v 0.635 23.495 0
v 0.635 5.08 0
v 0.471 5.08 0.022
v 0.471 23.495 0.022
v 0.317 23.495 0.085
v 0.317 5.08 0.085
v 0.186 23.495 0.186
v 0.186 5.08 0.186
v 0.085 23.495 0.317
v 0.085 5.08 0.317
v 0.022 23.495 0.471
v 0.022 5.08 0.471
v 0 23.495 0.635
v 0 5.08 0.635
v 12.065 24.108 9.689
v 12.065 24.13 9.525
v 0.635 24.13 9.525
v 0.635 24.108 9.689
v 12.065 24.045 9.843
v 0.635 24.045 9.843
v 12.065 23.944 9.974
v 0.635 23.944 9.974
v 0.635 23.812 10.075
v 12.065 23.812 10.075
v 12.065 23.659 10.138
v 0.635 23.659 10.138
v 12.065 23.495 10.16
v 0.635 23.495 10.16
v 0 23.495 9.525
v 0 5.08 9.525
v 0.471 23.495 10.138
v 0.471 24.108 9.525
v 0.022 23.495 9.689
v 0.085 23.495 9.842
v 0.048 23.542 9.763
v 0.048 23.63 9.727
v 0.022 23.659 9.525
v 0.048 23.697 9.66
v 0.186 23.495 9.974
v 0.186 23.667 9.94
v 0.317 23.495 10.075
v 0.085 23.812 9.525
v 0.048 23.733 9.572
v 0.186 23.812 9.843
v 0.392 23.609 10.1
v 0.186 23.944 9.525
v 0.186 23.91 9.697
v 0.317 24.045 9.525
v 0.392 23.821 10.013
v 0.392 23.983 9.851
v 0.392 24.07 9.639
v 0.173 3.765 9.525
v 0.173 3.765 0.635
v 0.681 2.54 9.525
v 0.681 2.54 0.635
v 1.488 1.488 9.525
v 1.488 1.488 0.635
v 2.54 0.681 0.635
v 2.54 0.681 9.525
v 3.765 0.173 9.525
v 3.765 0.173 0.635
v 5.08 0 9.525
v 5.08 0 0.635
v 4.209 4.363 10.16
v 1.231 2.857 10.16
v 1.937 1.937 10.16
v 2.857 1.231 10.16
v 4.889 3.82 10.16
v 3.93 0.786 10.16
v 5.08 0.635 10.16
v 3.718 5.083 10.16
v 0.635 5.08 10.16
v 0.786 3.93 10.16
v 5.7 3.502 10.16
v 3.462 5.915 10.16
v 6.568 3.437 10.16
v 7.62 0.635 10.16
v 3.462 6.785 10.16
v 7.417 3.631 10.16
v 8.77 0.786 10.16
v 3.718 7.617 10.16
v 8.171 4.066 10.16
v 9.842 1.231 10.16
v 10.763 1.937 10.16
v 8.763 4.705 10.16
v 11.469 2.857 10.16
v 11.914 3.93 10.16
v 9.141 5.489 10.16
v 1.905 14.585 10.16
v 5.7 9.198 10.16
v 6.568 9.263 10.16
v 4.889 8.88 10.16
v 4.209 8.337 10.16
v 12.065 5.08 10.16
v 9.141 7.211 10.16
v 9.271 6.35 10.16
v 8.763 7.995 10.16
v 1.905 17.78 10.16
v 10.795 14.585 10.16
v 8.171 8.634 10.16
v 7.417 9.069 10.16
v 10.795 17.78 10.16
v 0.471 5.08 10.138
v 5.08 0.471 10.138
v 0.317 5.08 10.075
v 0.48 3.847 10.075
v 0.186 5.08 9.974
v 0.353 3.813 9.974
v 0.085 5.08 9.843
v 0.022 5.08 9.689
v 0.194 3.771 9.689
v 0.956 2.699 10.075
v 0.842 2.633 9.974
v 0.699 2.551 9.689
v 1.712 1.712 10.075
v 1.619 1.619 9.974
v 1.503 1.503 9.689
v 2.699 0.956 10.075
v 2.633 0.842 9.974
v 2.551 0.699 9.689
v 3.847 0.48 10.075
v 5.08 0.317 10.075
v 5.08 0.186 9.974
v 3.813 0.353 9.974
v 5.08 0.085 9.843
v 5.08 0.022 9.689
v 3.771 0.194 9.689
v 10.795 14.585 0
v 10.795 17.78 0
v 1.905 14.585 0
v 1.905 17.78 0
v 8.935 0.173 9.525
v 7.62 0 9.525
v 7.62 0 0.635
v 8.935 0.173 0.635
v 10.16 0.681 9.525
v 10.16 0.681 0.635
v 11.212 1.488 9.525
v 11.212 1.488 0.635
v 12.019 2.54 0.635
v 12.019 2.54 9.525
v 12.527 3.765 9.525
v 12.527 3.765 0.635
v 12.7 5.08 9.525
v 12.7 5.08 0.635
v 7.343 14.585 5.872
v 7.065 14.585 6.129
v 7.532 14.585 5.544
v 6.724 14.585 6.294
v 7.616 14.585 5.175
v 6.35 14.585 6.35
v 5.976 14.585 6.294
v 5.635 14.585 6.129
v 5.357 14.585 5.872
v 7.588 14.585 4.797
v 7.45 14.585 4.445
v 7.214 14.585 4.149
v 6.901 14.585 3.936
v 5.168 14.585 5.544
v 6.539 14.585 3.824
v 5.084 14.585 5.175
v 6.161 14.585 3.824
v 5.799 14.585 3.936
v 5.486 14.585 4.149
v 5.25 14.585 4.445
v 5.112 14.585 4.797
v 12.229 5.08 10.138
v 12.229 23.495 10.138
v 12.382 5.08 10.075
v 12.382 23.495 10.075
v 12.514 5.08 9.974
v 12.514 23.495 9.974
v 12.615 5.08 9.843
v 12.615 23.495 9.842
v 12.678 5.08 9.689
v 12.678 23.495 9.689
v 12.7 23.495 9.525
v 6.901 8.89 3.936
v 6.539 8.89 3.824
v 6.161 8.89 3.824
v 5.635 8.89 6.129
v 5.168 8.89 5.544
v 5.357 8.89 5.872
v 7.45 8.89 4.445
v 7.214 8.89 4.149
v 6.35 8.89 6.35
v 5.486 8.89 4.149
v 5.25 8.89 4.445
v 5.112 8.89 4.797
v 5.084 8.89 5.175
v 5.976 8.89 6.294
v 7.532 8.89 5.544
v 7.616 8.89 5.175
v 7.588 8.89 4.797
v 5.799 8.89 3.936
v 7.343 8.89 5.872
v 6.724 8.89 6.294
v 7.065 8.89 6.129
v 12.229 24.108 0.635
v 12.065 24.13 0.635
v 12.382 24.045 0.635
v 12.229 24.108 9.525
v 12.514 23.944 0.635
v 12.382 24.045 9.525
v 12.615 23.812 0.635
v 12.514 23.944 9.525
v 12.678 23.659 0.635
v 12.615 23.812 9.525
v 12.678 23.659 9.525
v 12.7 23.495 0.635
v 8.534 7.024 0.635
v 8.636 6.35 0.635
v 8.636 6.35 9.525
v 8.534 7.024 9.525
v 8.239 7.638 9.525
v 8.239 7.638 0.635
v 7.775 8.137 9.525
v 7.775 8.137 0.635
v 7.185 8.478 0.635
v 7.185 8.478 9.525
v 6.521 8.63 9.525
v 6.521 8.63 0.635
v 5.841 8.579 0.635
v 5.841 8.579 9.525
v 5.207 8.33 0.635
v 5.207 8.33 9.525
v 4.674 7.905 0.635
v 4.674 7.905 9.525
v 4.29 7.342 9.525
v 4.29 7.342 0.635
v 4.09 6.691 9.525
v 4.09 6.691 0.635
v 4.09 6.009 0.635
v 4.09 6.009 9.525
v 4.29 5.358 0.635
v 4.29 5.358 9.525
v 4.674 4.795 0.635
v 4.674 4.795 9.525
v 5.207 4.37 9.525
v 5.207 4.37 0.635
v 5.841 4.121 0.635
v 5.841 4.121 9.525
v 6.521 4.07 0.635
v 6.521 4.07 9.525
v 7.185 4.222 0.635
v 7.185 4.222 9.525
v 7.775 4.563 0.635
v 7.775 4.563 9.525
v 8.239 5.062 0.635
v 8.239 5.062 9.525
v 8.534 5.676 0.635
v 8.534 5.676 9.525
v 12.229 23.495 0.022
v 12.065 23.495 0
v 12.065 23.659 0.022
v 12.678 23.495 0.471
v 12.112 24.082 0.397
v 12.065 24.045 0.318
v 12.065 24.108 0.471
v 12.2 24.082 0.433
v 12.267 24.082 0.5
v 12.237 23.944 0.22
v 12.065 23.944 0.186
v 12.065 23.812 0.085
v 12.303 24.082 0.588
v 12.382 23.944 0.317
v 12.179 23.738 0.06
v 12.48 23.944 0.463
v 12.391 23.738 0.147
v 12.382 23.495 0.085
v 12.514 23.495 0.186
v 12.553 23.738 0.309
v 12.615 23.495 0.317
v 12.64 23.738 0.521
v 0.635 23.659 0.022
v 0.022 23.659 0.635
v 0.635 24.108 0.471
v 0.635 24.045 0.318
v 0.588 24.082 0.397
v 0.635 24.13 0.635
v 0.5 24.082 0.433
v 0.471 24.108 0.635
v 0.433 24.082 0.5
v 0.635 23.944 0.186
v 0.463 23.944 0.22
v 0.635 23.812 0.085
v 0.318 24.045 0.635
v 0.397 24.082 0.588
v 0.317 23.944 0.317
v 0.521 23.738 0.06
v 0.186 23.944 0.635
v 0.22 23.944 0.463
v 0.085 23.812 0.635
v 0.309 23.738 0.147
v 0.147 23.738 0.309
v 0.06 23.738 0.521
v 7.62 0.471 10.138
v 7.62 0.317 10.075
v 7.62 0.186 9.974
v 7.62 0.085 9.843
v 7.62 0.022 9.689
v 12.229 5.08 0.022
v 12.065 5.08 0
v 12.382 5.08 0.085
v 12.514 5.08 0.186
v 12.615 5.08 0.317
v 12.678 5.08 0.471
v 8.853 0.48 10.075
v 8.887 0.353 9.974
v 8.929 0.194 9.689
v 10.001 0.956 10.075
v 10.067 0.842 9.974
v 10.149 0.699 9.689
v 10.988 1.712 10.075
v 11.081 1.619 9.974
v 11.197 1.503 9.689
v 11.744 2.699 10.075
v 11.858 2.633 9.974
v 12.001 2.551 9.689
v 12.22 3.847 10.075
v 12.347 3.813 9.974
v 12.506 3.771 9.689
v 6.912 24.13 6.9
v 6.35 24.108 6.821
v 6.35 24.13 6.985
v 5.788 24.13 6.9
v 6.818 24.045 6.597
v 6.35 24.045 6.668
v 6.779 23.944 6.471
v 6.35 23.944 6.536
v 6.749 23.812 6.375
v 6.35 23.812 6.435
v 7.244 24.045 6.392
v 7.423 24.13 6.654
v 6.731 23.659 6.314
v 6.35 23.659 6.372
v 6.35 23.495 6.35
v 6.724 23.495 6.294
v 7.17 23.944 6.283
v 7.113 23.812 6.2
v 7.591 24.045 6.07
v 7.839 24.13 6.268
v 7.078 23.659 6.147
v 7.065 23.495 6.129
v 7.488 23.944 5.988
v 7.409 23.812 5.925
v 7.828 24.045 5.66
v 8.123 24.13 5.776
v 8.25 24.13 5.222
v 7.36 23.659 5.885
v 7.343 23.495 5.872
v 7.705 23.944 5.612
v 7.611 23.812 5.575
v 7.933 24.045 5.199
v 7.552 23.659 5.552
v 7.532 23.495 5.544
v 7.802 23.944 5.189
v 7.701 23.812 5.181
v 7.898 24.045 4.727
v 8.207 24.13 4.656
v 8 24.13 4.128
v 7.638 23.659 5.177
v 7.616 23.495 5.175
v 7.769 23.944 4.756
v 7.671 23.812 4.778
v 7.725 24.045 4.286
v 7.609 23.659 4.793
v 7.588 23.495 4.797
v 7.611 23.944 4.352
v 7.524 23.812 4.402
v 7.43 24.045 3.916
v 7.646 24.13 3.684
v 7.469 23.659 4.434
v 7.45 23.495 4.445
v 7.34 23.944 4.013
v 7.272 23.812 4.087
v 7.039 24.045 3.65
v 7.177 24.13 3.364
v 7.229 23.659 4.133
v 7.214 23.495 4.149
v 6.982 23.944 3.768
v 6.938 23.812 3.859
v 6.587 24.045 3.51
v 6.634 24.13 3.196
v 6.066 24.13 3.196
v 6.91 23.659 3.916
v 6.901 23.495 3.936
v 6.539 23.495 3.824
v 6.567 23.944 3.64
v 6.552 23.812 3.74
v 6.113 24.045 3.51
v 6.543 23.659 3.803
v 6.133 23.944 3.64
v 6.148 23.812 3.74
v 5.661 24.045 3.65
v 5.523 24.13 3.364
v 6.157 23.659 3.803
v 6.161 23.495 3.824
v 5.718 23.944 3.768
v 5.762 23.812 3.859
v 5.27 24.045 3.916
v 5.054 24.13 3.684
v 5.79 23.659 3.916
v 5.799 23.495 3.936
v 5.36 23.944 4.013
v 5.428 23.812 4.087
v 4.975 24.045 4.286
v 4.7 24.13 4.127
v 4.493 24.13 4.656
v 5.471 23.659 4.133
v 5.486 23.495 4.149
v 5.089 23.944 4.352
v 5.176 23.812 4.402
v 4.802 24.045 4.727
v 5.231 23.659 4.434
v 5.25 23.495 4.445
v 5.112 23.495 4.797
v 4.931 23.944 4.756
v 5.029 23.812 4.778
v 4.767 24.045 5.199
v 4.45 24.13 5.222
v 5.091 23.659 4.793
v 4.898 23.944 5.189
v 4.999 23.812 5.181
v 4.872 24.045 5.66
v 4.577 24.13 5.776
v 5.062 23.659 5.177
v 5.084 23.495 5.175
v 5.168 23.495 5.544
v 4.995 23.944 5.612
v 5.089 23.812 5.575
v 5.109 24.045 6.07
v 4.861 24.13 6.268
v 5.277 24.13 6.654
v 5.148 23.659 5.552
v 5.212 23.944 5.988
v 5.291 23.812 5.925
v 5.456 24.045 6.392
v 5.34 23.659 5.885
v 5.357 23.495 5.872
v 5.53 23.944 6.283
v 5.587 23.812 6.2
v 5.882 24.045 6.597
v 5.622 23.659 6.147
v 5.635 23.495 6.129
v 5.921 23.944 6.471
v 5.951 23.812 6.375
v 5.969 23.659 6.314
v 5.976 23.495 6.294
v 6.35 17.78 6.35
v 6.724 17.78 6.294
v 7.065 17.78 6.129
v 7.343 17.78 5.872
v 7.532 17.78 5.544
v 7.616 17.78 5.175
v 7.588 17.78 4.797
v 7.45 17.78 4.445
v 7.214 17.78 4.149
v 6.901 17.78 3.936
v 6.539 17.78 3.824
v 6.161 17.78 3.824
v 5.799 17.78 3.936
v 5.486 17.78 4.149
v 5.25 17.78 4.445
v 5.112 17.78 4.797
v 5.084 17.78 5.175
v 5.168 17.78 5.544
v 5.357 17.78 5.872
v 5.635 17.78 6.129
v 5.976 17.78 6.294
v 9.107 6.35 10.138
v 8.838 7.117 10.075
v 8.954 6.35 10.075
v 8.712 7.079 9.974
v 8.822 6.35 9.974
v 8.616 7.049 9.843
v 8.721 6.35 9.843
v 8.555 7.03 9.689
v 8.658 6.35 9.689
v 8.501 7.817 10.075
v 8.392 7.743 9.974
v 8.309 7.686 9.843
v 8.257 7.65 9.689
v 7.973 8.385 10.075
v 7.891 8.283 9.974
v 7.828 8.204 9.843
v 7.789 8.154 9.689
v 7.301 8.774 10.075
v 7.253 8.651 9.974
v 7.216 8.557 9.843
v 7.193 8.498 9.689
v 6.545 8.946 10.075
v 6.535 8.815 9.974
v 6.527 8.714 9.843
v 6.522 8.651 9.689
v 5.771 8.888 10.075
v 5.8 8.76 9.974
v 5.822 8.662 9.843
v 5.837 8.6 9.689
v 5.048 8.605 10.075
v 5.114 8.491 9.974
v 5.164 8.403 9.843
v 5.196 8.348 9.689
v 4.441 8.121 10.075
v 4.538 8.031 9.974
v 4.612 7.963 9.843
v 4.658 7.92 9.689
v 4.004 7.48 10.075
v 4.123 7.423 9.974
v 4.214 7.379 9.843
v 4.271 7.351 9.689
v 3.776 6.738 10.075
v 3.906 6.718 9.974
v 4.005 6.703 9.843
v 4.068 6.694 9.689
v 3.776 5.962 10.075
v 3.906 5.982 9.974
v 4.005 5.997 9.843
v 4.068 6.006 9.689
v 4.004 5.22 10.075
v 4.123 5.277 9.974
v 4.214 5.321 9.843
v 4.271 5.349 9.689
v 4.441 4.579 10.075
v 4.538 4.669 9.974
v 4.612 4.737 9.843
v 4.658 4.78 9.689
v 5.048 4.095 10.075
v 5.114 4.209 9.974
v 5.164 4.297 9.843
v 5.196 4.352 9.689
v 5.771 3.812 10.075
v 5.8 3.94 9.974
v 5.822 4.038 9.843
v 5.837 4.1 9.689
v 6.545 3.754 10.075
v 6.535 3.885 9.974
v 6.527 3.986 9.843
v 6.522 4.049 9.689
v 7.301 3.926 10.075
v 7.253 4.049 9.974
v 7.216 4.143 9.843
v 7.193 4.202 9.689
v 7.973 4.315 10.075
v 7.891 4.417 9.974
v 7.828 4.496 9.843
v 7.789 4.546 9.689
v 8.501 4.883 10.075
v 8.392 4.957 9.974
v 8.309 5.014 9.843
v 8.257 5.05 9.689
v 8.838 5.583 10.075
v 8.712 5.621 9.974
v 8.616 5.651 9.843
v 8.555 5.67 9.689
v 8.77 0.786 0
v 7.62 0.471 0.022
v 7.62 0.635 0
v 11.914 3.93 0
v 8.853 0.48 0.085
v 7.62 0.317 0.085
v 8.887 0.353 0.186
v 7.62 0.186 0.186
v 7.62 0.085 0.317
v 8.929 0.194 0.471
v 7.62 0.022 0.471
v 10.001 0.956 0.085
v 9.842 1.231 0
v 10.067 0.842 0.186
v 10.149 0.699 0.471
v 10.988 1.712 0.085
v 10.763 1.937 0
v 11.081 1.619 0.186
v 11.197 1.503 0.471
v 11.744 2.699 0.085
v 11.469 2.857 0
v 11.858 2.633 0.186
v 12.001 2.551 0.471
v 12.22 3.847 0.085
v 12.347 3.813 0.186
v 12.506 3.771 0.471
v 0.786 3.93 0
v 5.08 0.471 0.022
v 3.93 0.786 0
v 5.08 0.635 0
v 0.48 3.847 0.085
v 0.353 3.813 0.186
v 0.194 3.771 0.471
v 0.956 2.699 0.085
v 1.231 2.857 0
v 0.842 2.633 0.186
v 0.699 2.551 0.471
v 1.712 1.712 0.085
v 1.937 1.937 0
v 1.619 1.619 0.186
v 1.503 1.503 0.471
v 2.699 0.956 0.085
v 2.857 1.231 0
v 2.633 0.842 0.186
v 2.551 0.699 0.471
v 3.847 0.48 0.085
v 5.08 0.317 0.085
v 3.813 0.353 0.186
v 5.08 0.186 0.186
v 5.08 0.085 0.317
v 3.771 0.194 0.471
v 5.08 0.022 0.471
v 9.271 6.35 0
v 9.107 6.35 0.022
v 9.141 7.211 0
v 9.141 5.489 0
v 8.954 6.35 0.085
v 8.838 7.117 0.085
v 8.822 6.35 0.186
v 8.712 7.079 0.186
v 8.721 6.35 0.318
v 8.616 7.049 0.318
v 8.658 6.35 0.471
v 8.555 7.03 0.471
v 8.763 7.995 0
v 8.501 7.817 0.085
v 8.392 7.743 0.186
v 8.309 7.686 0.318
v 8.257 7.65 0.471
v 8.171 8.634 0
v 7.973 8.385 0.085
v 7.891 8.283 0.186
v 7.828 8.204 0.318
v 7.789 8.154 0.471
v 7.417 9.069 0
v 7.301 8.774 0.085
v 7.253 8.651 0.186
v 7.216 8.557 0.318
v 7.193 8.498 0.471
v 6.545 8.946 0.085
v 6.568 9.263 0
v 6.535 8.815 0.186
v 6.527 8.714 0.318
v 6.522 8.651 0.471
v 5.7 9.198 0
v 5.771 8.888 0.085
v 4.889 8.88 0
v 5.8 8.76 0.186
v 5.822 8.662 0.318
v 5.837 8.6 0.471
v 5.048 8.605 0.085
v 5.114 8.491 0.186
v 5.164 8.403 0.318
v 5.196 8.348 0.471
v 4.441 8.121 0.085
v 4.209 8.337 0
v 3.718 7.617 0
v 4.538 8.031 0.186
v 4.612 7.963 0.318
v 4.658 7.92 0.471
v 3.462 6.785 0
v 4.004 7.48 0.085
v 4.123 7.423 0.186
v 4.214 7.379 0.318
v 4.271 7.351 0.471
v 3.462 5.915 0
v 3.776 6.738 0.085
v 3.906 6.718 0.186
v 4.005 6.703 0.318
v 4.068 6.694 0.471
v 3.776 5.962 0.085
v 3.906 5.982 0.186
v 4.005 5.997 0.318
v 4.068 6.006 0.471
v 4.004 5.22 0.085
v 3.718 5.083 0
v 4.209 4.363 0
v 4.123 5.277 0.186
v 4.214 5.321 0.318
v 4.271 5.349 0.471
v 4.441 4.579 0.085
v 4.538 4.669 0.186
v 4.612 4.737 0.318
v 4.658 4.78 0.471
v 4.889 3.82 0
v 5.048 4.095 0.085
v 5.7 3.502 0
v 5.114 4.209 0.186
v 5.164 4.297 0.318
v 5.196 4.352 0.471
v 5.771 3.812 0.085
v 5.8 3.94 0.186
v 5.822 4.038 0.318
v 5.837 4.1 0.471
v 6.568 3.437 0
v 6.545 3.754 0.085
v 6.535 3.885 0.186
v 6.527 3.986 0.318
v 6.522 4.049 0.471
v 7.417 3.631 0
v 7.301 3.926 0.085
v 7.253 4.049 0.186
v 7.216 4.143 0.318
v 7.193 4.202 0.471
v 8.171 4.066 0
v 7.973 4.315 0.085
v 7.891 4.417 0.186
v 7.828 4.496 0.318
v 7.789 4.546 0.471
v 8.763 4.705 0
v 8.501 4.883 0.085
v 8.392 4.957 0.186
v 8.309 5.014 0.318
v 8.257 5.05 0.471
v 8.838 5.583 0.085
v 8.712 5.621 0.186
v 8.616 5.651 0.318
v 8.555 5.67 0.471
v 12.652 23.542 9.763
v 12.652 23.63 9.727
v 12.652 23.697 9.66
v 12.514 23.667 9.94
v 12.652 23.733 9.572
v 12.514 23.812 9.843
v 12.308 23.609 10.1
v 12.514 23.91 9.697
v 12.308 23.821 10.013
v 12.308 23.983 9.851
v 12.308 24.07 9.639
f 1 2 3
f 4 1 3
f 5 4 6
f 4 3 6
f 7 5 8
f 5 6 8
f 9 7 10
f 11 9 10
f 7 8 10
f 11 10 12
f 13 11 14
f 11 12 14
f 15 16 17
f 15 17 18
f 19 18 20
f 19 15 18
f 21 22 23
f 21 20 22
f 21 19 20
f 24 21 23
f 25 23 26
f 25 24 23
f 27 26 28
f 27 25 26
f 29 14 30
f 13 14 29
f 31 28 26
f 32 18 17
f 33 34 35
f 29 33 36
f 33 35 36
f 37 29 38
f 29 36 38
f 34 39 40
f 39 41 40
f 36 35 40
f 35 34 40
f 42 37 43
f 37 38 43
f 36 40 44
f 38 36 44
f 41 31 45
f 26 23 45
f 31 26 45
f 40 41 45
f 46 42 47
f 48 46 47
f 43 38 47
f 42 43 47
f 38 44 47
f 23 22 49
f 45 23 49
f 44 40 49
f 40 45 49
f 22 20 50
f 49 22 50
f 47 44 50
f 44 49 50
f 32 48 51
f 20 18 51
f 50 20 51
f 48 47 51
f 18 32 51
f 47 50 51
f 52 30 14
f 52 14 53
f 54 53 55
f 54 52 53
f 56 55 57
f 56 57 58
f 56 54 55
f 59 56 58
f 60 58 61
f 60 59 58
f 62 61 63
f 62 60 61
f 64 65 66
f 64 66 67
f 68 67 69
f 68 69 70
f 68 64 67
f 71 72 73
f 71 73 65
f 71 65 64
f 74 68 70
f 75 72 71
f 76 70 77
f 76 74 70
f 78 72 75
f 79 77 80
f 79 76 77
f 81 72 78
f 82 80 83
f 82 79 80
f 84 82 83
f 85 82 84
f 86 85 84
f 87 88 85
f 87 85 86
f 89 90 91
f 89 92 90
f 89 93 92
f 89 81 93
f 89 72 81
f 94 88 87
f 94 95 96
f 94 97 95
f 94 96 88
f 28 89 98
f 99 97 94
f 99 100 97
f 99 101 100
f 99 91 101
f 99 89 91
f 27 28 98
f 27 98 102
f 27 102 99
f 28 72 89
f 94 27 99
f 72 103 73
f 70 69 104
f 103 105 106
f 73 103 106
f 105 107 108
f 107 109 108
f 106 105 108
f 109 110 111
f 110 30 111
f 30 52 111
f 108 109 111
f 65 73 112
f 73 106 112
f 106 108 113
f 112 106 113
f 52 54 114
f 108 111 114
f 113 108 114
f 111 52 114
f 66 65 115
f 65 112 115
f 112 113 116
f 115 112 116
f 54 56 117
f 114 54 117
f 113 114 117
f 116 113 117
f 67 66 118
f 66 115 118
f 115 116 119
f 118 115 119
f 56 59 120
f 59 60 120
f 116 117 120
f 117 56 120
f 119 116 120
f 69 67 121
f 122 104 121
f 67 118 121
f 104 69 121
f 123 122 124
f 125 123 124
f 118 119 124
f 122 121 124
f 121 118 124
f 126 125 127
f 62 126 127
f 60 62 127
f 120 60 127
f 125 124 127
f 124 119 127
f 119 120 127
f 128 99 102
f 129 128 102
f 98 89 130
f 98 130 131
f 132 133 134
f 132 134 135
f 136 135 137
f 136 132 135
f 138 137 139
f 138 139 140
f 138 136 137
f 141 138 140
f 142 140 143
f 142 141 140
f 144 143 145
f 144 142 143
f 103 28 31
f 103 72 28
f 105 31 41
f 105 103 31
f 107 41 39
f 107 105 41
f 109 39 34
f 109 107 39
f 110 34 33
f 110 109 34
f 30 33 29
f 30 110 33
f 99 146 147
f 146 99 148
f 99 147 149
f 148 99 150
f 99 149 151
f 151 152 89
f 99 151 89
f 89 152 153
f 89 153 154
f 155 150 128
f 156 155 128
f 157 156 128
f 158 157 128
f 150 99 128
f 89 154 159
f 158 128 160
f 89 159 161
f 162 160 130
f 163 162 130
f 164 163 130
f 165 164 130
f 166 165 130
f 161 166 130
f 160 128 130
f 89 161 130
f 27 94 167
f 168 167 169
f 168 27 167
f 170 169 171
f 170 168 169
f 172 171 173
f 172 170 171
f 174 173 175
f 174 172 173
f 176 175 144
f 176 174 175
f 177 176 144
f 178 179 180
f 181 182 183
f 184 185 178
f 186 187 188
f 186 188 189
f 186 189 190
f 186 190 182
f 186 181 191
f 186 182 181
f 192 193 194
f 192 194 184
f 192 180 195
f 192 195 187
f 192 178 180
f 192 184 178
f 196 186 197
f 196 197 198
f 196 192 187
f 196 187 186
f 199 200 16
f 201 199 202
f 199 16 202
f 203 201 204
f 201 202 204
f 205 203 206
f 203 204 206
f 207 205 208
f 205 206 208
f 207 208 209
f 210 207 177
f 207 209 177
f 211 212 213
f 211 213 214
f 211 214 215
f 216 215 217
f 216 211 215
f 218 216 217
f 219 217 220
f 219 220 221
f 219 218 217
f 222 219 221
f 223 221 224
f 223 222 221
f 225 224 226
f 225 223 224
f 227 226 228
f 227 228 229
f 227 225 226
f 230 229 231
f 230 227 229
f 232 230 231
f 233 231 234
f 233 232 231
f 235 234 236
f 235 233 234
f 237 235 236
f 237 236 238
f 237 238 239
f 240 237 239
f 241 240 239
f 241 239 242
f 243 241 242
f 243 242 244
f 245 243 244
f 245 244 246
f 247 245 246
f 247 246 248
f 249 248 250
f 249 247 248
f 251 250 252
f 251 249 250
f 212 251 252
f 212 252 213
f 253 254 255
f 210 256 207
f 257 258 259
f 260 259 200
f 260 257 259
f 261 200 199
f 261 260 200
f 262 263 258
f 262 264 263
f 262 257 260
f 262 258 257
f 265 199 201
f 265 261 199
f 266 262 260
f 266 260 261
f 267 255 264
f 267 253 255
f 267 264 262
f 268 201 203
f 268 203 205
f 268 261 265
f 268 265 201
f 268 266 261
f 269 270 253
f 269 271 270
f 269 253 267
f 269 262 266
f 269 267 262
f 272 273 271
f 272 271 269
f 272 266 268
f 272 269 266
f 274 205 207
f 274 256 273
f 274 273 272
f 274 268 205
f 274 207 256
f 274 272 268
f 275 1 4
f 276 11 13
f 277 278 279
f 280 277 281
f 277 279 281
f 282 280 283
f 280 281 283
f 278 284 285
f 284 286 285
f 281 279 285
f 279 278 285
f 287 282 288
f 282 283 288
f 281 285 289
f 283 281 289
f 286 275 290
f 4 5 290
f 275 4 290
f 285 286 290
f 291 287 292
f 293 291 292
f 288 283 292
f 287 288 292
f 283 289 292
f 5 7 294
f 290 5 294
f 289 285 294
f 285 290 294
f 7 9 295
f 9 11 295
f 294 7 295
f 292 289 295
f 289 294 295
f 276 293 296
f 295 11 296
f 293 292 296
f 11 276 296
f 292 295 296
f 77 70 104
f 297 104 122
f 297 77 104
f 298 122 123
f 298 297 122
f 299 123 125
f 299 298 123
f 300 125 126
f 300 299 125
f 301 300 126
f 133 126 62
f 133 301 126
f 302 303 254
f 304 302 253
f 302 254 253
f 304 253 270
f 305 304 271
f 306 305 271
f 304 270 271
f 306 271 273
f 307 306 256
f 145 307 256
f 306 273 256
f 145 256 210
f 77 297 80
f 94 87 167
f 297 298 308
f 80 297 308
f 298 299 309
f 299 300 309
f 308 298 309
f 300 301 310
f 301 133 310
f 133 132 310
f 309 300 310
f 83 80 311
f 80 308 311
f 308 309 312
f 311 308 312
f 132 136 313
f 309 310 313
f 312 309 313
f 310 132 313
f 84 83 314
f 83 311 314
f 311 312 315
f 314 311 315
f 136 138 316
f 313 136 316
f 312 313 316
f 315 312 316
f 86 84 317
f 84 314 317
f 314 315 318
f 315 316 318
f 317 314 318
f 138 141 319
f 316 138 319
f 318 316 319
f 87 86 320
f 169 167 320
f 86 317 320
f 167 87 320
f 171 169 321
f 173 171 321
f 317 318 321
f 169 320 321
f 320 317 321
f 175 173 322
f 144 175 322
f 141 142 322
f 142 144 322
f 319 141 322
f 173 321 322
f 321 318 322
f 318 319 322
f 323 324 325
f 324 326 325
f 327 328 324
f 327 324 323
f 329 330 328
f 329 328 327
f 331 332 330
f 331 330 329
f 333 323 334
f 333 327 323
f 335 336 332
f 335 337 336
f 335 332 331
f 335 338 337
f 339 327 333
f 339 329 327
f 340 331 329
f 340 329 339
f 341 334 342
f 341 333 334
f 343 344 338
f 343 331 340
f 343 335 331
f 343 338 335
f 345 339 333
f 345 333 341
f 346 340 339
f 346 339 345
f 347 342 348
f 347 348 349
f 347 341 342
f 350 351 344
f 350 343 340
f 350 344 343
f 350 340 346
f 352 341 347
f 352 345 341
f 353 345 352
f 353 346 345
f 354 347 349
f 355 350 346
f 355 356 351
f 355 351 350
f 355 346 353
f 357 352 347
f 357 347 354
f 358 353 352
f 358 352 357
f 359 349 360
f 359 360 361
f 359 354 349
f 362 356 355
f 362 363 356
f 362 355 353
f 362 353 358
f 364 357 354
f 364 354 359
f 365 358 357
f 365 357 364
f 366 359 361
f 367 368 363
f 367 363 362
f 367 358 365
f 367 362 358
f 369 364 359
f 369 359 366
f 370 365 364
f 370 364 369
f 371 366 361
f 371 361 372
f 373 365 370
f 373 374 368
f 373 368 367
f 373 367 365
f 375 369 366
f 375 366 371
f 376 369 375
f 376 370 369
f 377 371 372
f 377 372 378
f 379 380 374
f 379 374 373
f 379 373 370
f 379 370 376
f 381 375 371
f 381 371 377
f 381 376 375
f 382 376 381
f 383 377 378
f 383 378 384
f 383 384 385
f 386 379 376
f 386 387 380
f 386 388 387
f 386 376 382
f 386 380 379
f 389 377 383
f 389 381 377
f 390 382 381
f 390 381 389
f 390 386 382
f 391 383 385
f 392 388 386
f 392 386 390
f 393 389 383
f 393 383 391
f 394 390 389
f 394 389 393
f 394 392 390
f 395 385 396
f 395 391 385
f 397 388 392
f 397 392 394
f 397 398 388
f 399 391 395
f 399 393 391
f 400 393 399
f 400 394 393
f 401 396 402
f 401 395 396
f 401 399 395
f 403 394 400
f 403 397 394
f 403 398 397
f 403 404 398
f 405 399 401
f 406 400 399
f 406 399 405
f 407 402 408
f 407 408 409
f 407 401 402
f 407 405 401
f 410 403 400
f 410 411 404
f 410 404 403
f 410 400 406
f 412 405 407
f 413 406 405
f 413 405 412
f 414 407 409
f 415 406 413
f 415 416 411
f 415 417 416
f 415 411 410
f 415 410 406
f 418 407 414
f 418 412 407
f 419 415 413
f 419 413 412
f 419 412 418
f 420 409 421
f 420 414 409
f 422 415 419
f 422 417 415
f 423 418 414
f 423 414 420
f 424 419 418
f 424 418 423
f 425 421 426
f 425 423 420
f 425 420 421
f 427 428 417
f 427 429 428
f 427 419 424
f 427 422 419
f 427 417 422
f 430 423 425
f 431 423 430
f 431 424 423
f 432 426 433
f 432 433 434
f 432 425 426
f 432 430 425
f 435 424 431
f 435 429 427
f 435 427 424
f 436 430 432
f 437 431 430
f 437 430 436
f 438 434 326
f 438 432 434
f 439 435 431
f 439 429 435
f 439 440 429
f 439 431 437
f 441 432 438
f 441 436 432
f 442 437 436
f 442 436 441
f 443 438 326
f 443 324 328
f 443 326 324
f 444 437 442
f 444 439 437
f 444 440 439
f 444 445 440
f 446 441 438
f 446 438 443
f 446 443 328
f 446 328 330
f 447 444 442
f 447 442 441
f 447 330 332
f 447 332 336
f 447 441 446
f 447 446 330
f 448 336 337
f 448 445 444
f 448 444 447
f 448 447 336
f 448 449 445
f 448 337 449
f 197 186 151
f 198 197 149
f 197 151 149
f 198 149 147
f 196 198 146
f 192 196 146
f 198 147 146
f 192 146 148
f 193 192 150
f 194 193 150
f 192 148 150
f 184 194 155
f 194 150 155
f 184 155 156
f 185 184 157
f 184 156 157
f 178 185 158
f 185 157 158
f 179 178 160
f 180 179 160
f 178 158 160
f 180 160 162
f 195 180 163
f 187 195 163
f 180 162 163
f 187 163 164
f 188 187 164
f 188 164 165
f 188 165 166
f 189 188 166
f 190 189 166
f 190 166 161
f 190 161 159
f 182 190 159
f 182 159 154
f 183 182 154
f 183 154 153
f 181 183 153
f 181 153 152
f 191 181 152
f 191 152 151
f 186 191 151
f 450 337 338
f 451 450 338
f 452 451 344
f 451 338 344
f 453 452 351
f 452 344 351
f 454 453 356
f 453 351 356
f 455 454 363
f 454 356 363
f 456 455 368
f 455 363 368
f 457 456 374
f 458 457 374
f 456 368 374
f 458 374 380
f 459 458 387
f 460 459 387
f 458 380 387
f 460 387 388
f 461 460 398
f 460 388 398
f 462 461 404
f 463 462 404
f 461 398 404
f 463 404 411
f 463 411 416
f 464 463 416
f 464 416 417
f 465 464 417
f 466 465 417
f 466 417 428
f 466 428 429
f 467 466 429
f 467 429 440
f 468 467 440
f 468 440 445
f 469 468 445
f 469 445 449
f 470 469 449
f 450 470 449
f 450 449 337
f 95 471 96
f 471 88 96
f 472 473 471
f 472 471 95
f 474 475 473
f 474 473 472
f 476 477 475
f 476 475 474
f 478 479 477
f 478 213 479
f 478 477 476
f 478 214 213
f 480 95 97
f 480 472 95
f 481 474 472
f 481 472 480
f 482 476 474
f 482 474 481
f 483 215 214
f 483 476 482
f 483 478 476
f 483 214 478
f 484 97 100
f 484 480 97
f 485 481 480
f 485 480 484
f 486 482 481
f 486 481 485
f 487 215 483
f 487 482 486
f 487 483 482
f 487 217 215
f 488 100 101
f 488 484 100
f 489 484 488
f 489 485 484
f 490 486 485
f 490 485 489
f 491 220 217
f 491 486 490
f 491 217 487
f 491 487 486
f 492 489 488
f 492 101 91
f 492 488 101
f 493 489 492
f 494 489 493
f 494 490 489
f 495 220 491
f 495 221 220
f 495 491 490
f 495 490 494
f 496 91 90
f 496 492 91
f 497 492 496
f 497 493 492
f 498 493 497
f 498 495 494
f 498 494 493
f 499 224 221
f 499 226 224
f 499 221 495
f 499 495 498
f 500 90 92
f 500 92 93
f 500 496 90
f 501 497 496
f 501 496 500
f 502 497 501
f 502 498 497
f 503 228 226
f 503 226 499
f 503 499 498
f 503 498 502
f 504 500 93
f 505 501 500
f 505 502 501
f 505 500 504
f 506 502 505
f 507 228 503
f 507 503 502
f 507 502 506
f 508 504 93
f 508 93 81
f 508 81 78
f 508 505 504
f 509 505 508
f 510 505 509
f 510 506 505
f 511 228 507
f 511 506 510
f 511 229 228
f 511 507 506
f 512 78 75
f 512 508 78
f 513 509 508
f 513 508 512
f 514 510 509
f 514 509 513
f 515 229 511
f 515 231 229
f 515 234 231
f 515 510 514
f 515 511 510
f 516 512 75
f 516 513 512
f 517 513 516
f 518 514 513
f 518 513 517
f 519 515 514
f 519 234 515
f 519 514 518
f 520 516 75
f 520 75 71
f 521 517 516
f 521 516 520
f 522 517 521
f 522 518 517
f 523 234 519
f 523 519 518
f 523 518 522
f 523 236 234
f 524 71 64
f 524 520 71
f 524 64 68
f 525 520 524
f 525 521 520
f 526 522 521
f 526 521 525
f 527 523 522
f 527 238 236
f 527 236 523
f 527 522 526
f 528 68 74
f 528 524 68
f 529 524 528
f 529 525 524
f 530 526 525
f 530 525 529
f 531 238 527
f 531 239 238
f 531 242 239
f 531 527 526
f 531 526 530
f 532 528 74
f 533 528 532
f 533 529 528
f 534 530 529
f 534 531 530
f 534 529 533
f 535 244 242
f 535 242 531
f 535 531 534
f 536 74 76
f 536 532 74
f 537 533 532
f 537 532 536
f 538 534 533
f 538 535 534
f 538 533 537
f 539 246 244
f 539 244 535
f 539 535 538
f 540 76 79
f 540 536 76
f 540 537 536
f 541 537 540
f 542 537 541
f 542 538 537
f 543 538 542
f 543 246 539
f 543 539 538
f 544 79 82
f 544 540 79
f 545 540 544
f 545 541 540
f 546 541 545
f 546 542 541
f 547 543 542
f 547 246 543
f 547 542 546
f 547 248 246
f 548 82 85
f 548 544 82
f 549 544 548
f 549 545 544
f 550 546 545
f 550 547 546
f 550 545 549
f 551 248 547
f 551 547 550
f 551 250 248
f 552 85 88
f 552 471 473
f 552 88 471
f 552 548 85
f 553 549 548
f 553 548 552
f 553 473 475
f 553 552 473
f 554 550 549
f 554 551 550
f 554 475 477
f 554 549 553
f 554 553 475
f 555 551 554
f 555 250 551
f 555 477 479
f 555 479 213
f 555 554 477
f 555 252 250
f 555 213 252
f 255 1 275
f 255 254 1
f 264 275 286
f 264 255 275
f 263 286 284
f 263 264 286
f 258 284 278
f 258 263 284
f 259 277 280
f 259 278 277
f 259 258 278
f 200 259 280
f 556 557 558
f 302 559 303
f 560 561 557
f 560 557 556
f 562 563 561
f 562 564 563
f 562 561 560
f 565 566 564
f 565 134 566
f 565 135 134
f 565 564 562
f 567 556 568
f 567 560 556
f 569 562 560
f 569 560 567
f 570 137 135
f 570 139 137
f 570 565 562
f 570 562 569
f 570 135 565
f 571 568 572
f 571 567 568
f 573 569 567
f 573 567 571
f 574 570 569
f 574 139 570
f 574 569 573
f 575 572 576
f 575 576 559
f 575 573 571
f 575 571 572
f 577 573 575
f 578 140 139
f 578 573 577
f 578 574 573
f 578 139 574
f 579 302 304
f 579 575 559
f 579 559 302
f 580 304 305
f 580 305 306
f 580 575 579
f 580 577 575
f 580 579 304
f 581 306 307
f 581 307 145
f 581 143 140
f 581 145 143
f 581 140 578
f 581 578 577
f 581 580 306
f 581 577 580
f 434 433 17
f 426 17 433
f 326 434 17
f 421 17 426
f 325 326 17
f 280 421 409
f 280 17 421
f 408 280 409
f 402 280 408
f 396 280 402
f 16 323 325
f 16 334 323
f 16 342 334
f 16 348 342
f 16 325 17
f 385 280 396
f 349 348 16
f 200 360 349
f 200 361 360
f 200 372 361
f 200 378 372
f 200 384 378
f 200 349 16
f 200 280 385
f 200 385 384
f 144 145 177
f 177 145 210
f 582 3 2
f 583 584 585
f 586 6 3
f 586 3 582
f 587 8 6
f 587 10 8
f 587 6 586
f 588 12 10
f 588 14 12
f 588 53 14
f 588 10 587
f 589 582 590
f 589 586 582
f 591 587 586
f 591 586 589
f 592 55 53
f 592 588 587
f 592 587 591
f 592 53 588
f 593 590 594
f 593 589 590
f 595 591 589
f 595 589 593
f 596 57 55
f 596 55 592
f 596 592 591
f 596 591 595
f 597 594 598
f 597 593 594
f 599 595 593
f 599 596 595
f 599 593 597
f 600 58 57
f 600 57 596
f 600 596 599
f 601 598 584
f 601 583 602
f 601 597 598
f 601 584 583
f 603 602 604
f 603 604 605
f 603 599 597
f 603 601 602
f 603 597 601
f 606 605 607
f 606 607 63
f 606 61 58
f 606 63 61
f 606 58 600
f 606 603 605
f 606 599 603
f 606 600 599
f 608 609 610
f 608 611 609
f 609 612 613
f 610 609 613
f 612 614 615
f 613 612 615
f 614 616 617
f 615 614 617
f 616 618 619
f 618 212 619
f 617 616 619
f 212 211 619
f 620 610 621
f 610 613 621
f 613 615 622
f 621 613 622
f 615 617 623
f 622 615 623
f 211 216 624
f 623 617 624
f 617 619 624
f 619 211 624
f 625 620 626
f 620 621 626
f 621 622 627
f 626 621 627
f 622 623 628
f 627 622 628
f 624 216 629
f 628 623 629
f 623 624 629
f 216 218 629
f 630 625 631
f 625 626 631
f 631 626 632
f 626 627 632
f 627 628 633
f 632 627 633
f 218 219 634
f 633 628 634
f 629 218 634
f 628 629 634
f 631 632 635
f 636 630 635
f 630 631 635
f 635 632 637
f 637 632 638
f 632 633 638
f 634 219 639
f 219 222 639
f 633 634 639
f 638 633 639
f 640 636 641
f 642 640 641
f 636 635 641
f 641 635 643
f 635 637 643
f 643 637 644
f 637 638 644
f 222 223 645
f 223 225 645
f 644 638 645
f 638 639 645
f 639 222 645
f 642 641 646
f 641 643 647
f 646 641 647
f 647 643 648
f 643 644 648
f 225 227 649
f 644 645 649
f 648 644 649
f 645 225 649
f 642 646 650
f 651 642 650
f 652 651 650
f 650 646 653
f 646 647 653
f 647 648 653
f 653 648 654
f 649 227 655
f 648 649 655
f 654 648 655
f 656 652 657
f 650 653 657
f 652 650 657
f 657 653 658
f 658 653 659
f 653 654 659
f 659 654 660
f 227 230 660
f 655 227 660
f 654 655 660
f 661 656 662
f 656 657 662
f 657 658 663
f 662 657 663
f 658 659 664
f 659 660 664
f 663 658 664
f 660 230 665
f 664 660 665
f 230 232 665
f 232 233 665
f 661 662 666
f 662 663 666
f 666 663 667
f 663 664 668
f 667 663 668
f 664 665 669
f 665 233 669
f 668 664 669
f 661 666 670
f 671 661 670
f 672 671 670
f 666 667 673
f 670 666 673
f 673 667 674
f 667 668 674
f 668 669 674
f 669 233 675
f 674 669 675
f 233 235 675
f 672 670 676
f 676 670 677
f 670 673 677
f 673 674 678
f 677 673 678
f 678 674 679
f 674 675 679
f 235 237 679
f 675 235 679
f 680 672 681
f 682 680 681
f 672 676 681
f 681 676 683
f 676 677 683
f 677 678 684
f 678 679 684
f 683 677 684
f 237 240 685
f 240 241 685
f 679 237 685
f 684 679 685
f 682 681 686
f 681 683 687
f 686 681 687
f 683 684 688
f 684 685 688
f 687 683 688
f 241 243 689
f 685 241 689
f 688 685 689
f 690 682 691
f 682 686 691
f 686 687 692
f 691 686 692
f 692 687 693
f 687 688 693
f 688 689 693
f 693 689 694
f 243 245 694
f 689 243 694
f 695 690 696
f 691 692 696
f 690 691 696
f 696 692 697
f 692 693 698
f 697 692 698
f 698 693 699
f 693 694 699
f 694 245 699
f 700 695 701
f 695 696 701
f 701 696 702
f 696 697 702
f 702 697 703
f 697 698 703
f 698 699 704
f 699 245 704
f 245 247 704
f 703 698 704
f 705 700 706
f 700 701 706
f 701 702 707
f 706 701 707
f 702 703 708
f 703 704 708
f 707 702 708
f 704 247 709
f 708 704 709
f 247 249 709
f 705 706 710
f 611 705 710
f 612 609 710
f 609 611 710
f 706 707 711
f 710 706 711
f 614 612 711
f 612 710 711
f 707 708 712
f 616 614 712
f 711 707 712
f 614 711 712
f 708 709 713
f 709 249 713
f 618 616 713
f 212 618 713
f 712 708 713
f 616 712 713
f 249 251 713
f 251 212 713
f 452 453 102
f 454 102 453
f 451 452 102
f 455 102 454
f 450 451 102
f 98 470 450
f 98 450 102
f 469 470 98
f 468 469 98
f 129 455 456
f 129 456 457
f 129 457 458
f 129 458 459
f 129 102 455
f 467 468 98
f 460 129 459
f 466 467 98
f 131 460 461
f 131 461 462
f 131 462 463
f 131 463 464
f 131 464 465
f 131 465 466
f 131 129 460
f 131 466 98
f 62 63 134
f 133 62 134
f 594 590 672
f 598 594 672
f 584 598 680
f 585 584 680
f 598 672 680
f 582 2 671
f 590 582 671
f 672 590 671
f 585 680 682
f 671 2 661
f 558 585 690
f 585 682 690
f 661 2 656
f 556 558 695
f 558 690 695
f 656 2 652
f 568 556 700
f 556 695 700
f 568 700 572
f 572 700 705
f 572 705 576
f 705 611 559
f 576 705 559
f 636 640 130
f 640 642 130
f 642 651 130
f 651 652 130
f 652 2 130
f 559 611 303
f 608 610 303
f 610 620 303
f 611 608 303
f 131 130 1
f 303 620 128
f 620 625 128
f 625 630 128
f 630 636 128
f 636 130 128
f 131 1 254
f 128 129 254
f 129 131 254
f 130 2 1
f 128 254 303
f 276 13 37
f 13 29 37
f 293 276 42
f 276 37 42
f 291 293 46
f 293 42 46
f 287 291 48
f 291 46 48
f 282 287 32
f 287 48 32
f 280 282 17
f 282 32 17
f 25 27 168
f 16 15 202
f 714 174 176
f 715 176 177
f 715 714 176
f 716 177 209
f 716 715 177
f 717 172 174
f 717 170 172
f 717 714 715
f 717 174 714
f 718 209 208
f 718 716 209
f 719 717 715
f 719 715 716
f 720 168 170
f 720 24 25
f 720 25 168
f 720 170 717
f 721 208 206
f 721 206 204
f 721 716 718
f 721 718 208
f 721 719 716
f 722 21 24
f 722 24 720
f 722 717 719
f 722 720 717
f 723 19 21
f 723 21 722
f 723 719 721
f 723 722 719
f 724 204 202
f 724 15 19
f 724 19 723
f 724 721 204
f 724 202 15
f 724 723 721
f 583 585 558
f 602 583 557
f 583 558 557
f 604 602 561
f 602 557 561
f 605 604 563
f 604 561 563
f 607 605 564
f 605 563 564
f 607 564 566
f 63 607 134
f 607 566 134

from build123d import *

# Parameters (mm, degrees)
SKETCH1_W           = 12.7
SKETCH1_H           = 24.13
SKETCH1_R           = 2.286
BOSS_EXTRUDE1_DEPTH = 10.16
SKETCH2_R           = 1.27
CUT_EXTRUDE1_DEPTH  = 15.24
FILLET2_R           = 5.08
FILLET1_R           = 0.635
SKETCH3_W           = 8.89
SKETCH3_H           = 3.19532
CUT_EXTRUDE2_DEPTH  = 30.099355663


with BuildPart() as part:
    # Sketch1 → Boss-Extrude1 (new body)
    with BuildSketch(Plane.XY):
        with Locations((6.35, 12.065)):
            Rectangle(SKETCH1_W, SKETCH1_H)
        with Locations((6.35, 6.35)):
            Circle(SKETCH1_R, mode=Mode.SUBTRACT)
    extrude(amount=BOSS_EXTRUDE1_DEPTH)

    # Sketch2 → Cut-Extrude1 (cut)
    with BuildSketch(Plane(origin=(0, 24.13, 0), x_dir=(1, 0, 0), z_dir=(0, 1, 0))):
        with Locations(Location((6.35, -5.08, 0), (0, 0, 270))):
            Circle(SKETCH2_R)
    extrude(amount=-CUT_EXTRUDE1_DEPTH, mode=Mode.SUBTRACT)

    # Fillet2
    fillet2_edges = [part.edges().sort_by_distance(p)[0] for p in [
        (12.7, 0, 5.08),
        (0, 0, 5.08),
    ]]
    fillet(fillet2_edges, radius=FILLET2_R)

    # Fillet1
    fillet1_edges = [part.edges().sort_by_distance(p)[0] for p in [
        (4.064, 6.35, 0),
        (4.064, 6.35, 10.16),
        (6.35, 24.13, 10.16),
        (6.35, 24.13, 3.81),
        (12.7, 14.605, 0),
        (12.7, 14.605, 10.16),
        (6.35, 0, 0),
        (1.487897552, 1.487897552, 0),
        (11.212102448, 1.487897552, 0),
        (6.35, 0, 10.16),
        (1.487897552, 1.487897552, 10.16),
        (11.212102448, 1.487897552, 10.16),
        (0, 14.605, 10.16),
        (6.35, 24.13, 0),
        (0, 14.605, 0),
        (0, 24.13, 5.08),
        (12.7, 24.13, 5.08),
    ]]
    fillet(fillet1_edges, radius=FILLET1_R)

    # Sketch3 → Cut-Extrude2 (cut, through all)
    with BuildSketch(Plane(origin=(0, 0, 0), x_dir=(-1, 0, 0), z_dir=(0, 0, -1))):
        with Locations((-6.35, 16.18234)):
            Rectangle(SKETCH3_W, SKETCH3_H)
    extrude(amount=-CUT_EXTRUDE2_DEPTH, mode=Mode.SUBTRACT)


solid = part.part
